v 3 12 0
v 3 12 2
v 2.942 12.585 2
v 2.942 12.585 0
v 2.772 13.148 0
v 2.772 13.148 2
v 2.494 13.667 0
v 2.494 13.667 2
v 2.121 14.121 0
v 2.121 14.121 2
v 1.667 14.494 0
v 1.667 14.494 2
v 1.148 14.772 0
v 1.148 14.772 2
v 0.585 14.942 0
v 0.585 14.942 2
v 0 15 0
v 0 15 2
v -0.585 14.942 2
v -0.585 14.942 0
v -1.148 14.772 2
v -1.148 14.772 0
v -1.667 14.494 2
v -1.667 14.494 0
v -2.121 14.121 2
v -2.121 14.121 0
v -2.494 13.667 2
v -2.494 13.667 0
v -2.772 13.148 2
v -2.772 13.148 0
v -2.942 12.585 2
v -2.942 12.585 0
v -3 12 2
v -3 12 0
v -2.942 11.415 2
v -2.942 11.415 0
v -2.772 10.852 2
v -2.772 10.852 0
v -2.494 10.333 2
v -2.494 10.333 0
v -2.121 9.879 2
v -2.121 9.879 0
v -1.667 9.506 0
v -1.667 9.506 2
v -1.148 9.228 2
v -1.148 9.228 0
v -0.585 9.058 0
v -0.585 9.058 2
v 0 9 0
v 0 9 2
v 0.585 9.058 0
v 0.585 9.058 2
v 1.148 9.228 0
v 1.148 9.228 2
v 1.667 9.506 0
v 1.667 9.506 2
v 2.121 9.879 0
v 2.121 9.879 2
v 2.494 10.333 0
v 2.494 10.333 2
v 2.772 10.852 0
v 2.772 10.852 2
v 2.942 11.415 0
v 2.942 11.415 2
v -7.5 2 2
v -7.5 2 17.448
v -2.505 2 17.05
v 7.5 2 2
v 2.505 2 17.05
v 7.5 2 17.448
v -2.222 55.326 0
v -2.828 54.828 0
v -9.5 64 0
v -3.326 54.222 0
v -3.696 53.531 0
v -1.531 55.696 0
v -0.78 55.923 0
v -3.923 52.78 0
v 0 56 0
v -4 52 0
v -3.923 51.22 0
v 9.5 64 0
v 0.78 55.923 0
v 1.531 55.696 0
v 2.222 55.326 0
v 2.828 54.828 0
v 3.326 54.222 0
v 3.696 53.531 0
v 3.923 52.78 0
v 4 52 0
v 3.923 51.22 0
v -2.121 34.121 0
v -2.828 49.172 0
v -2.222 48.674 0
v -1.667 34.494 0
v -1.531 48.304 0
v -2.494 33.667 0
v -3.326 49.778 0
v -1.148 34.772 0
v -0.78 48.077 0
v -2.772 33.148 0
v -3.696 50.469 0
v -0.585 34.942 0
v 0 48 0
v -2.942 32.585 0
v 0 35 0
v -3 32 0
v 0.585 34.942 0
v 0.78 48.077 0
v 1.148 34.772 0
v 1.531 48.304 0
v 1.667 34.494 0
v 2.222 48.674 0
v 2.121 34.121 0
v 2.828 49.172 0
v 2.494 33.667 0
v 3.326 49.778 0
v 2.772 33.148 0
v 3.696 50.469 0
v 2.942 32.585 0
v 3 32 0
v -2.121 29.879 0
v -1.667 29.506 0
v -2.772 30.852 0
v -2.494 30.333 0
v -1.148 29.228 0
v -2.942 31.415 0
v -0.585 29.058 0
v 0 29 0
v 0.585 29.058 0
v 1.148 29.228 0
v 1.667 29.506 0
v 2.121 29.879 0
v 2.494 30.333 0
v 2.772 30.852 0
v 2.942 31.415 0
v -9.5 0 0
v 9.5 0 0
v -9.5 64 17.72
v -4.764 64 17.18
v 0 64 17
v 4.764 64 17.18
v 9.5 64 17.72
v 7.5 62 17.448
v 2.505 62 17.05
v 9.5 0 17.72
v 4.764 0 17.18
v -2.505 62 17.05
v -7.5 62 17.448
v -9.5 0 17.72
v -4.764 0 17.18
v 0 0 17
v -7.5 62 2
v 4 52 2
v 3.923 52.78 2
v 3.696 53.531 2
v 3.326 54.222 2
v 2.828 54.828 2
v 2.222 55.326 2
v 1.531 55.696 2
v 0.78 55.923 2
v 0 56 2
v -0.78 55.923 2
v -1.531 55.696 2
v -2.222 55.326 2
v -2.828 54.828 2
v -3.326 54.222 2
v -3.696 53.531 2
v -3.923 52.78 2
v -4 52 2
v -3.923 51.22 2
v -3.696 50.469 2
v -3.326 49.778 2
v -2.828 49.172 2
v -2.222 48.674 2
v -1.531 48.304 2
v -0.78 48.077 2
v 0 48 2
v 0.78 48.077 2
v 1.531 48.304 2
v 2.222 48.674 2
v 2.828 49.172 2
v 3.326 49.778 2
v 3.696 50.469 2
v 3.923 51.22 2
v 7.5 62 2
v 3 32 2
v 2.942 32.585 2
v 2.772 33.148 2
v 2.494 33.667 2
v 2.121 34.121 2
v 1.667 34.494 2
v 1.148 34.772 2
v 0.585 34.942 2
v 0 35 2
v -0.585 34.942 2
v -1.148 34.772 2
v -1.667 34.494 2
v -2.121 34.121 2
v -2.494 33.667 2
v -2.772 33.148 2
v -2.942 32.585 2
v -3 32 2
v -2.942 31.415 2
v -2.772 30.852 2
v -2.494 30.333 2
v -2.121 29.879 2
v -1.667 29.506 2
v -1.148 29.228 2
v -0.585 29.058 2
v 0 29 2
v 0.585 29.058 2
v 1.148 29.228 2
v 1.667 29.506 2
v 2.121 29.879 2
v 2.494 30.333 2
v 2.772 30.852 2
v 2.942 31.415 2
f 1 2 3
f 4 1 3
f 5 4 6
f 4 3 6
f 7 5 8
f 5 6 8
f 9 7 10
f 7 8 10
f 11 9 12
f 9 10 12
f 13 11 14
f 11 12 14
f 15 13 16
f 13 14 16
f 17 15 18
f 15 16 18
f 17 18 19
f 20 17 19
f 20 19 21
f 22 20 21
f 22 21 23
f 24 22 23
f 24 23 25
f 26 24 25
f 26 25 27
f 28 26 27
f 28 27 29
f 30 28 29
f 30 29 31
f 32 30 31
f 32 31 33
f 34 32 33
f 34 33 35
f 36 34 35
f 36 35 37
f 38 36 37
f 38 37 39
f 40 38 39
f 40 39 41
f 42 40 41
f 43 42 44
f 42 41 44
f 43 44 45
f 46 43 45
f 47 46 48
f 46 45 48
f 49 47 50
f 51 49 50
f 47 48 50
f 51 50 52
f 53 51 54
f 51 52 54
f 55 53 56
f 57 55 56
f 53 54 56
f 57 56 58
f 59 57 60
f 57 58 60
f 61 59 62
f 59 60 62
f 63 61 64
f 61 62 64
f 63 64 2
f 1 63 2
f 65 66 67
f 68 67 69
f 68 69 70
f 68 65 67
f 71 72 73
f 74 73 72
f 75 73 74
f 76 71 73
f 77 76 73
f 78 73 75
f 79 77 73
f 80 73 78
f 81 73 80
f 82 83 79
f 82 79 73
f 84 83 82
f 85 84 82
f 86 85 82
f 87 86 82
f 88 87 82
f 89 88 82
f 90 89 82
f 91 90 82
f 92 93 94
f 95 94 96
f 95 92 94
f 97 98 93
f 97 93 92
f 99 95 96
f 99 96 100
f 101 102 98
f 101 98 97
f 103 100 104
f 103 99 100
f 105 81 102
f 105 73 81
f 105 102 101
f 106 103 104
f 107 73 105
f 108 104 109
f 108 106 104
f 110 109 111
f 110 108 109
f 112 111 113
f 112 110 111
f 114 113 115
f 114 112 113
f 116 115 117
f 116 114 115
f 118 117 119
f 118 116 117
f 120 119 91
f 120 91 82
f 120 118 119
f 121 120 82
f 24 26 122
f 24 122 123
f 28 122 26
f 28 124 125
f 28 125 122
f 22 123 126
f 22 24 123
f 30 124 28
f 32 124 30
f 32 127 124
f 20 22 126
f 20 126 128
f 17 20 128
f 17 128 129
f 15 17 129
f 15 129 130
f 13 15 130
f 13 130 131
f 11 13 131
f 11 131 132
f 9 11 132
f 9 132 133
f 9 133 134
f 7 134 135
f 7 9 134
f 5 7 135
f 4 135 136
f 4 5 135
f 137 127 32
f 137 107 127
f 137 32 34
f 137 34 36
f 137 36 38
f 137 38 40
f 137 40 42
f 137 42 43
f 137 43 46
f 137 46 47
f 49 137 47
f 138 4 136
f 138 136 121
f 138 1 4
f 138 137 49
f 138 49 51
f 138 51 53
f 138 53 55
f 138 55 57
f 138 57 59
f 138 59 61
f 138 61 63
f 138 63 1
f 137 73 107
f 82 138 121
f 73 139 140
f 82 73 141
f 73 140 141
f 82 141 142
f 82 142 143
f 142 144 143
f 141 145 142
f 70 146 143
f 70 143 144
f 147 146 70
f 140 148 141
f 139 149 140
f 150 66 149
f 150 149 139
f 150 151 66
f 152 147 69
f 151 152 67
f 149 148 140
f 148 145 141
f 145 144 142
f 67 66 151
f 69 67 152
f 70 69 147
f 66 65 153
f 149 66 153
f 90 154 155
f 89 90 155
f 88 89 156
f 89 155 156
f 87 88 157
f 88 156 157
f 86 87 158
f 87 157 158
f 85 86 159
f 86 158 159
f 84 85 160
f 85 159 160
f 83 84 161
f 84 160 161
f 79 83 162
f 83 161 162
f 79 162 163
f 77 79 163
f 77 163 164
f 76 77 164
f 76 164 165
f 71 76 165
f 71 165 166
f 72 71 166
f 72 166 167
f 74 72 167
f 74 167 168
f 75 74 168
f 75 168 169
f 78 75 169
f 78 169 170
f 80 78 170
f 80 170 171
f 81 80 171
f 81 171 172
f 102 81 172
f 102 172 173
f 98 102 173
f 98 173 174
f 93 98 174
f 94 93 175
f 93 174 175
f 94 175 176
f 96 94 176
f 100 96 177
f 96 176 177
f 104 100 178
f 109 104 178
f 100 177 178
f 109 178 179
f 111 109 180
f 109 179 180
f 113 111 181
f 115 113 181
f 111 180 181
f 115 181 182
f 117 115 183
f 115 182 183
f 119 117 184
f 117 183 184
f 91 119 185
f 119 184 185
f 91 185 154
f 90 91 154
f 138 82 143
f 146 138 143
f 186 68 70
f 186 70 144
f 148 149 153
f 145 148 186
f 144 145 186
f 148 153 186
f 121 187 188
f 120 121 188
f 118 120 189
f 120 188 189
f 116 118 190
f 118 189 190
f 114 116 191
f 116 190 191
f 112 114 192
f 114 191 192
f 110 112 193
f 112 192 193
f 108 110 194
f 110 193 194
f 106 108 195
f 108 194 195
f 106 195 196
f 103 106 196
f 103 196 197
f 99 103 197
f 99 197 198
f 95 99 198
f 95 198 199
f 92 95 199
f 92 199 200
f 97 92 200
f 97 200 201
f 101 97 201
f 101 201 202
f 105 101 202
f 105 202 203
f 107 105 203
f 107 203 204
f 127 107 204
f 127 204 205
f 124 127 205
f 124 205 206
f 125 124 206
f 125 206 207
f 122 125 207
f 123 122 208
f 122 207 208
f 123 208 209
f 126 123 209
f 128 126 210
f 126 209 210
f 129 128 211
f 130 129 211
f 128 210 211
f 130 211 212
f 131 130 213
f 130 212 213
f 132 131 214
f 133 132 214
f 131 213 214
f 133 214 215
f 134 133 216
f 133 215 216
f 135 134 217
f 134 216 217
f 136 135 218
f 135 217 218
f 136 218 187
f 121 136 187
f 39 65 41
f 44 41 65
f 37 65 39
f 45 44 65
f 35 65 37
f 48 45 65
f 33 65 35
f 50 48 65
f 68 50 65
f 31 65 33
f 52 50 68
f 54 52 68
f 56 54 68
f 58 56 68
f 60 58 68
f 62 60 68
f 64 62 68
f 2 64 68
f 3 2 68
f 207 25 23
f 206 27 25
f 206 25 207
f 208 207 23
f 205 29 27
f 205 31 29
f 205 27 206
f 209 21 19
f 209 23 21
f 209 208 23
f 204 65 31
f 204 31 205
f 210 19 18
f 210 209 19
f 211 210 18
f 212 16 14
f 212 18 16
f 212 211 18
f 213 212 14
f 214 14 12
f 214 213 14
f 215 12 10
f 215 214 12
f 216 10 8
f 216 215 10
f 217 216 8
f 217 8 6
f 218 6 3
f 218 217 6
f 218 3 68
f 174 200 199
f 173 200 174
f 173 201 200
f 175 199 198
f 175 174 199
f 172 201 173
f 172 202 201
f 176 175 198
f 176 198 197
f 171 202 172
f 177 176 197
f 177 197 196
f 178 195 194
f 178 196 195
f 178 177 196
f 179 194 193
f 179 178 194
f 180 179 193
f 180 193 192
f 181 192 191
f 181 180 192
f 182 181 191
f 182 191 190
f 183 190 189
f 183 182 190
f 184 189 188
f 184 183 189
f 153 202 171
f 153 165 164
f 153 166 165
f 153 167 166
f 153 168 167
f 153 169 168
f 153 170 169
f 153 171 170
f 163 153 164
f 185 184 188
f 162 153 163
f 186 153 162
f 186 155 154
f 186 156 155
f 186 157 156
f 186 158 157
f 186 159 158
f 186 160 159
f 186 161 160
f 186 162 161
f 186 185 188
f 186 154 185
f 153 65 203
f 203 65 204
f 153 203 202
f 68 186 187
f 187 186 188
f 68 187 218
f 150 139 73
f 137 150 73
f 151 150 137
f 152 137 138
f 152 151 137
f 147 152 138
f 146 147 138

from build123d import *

# Parameters (mm, degrees)
F1_DEPTH = 64
F3_W     = 15
F3_H     = 60
F4_DEPTH = 25
F5_R     = 3
F5_R_2   = 4
F6_DEPTH = 25


with BuildPart() as f1:
    # F0 (on Front) → F1 (new body)
    with BuildSketch(Plane.XZ):
        with BuildLine():
            Line((-9.5, 17.720389), (-9.5, 0))
            Line((-9.5, 0), (9.5, 0))
            Line((9.5, 0), (9.5, 17.720389))
            ThreePointArc((9.5, 17.720389), (0, 17), (-9.5, 17.720389))
        make_face()
    extrude(amount=-F1_DEPTH)

    # F3 (on offset) → F4 (cut)
    with BuildSketch(Plane.XY.offset(2)):
        with Locations((0, 32)):
            Rectangle(F3_W, F3_H)
    extrude(amount=F4_DEPTH, mode=Mode.SUBTRACT)

    # F5 (on face) → F6 (cut)
    with BuildSketch(Plane.XY.offset(2)):
        with Locations((0, 12)):
            Circle(F5_R)
        with Locations((0, 32)):
            Circle(F5_R)
        with Locations((0, 52)):
            Circle(F5_R_2)
    extrude(amount=-F6_DEPTH, mode=Mode.SUBTRACT)


solid = f1.part
